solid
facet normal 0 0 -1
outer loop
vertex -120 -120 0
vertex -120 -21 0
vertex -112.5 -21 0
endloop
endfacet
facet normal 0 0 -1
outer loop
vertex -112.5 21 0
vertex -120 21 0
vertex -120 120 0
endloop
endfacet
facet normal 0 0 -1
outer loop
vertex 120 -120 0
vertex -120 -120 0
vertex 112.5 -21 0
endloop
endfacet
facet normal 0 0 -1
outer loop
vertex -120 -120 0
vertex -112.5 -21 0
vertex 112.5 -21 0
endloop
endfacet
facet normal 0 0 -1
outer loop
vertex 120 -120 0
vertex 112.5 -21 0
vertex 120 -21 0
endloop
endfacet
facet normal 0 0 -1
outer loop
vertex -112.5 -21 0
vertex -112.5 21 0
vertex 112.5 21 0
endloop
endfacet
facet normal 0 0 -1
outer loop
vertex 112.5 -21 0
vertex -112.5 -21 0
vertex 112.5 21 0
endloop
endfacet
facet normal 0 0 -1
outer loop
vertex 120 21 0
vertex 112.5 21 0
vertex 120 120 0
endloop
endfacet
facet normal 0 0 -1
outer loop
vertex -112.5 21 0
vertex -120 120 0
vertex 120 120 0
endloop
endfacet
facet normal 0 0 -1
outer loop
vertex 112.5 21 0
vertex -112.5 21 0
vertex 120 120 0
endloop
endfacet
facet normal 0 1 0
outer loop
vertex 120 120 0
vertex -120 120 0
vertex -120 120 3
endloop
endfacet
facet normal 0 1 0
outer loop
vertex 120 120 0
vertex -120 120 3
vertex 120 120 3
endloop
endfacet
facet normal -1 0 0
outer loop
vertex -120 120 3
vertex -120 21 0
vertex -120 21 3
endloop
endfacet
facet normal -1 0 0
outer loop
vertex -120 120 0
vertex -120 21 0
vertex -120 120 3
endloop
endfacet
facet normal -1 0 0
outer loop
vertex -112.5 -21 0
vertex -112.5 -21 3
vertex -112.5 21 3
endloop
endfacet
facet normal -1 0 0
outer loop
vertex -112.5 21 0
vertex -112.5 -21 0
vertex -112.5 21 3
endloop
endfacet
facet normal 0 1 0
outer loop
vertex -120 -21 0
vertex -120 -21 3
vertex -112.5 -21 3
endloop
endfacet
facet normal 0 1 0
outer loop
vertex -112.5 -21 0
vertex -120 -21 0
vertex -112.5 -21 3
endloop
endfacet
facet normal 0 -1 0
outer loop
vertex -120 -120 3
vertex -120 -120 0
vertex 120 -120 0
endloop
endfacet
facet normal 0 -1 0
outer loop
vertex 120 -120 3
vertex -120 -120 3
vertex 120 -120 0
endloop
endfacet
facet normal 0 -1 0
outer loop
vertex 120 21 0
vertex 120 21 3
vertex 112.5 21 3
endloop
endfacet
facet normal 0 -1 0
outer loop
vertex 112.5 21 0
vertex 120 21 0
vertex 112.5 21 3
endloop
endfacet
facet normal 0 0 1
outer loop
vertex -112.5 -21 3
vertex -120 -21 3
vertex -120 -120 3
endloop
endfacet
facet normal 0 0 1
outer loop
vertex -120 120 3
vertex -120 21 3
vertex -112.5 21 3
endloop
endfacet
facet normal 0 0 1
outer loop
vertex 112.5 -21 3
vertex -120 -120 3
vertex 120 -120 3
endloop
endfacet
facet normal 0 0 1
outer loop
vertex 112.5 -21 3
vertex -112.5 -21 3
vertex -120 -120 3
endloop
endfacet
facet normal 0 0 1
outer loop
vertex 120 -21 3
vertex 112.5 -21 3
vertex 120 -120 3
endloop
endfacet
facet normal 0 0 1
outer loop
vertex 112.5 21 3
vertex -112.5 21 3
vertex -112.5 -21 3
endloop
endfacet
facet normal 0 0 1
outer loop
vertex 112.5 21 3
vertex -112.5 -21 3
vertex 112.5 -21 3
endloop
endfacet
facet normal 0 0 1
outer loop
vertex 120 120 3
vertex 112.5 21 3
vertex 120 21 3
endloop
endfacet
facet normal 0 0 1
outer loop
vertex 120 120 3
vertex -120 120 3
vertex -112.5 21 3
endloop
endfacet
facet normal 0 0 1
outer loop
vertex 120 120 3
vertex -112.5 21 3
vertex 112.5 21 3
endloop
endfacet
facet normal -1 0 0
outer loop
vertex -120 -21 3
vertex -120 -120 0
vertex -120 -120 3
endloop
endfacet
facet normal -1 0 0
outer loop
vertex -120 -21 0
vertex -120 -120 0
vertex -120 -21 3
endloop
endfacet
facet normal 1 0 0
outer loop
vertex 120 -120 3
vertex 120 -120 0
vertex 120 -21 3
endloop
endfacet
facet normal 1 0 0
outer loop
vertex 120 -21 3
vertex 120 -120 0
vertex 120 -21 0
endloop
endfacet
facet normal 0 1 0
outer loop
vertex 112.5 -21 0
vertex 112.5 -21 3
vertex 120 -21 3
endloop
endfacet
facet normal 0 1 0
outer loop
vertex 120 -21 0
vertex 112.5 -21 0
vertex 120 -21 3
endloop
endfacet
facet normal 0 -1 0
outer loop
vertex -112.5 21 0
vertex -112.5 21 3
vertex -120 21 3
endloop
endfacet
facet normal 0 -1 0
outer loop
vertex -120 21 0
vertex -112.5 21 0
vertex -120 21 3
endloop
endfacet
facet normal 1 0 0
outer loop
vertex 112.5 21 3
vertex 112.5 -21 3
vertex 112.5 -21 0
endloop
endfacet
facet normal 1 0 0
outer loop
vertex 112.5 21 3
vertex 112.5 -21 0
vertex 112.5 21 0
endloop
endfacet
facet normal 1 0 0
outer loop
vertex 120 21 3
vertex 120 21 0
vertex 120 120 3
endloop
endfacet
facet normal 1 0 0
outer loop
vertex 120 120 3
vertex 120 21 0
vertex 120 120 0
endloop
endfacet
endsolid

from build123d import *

# Parameters (mm, degrees)
F0_W     = 240
F0_H     = 240
F1_DEPTH = 3
F2_W     = 2.5
F2_H     = 42
F2_W_2   = 5
F3_DEPTH = 25


with BuildPart() as f1:
    # F0 (on Top) → F1 (new body)
    with BuildSketch(Plane.XY):
        Rectangle(F0_W, F0_H)
    extrude(amount=F1_DEPTH)

    # F2 (on face) → F3 (cut)
    with BuildSketch(Plane.XY.offset(3)):
        with Locations((-118.75, 0)):
            Rectangle(F2_W, F2_H)
        with Locations((118.75, 0)):
            Rectangle(F2_W, F2_H)
        with Locations((-115, 0)):
            Rectangle(F2_W_2, F2_H)
        with Locations((115, 0)):
            Rectangle(F2_W_2, F2_H)
        with Locations((121.25, 0)):
            Rectangle(F2_W, F2_H)
    extrude(amount=-F3_DEPTH, mode=Mode.SUBTRACT)


solid = f1.part
